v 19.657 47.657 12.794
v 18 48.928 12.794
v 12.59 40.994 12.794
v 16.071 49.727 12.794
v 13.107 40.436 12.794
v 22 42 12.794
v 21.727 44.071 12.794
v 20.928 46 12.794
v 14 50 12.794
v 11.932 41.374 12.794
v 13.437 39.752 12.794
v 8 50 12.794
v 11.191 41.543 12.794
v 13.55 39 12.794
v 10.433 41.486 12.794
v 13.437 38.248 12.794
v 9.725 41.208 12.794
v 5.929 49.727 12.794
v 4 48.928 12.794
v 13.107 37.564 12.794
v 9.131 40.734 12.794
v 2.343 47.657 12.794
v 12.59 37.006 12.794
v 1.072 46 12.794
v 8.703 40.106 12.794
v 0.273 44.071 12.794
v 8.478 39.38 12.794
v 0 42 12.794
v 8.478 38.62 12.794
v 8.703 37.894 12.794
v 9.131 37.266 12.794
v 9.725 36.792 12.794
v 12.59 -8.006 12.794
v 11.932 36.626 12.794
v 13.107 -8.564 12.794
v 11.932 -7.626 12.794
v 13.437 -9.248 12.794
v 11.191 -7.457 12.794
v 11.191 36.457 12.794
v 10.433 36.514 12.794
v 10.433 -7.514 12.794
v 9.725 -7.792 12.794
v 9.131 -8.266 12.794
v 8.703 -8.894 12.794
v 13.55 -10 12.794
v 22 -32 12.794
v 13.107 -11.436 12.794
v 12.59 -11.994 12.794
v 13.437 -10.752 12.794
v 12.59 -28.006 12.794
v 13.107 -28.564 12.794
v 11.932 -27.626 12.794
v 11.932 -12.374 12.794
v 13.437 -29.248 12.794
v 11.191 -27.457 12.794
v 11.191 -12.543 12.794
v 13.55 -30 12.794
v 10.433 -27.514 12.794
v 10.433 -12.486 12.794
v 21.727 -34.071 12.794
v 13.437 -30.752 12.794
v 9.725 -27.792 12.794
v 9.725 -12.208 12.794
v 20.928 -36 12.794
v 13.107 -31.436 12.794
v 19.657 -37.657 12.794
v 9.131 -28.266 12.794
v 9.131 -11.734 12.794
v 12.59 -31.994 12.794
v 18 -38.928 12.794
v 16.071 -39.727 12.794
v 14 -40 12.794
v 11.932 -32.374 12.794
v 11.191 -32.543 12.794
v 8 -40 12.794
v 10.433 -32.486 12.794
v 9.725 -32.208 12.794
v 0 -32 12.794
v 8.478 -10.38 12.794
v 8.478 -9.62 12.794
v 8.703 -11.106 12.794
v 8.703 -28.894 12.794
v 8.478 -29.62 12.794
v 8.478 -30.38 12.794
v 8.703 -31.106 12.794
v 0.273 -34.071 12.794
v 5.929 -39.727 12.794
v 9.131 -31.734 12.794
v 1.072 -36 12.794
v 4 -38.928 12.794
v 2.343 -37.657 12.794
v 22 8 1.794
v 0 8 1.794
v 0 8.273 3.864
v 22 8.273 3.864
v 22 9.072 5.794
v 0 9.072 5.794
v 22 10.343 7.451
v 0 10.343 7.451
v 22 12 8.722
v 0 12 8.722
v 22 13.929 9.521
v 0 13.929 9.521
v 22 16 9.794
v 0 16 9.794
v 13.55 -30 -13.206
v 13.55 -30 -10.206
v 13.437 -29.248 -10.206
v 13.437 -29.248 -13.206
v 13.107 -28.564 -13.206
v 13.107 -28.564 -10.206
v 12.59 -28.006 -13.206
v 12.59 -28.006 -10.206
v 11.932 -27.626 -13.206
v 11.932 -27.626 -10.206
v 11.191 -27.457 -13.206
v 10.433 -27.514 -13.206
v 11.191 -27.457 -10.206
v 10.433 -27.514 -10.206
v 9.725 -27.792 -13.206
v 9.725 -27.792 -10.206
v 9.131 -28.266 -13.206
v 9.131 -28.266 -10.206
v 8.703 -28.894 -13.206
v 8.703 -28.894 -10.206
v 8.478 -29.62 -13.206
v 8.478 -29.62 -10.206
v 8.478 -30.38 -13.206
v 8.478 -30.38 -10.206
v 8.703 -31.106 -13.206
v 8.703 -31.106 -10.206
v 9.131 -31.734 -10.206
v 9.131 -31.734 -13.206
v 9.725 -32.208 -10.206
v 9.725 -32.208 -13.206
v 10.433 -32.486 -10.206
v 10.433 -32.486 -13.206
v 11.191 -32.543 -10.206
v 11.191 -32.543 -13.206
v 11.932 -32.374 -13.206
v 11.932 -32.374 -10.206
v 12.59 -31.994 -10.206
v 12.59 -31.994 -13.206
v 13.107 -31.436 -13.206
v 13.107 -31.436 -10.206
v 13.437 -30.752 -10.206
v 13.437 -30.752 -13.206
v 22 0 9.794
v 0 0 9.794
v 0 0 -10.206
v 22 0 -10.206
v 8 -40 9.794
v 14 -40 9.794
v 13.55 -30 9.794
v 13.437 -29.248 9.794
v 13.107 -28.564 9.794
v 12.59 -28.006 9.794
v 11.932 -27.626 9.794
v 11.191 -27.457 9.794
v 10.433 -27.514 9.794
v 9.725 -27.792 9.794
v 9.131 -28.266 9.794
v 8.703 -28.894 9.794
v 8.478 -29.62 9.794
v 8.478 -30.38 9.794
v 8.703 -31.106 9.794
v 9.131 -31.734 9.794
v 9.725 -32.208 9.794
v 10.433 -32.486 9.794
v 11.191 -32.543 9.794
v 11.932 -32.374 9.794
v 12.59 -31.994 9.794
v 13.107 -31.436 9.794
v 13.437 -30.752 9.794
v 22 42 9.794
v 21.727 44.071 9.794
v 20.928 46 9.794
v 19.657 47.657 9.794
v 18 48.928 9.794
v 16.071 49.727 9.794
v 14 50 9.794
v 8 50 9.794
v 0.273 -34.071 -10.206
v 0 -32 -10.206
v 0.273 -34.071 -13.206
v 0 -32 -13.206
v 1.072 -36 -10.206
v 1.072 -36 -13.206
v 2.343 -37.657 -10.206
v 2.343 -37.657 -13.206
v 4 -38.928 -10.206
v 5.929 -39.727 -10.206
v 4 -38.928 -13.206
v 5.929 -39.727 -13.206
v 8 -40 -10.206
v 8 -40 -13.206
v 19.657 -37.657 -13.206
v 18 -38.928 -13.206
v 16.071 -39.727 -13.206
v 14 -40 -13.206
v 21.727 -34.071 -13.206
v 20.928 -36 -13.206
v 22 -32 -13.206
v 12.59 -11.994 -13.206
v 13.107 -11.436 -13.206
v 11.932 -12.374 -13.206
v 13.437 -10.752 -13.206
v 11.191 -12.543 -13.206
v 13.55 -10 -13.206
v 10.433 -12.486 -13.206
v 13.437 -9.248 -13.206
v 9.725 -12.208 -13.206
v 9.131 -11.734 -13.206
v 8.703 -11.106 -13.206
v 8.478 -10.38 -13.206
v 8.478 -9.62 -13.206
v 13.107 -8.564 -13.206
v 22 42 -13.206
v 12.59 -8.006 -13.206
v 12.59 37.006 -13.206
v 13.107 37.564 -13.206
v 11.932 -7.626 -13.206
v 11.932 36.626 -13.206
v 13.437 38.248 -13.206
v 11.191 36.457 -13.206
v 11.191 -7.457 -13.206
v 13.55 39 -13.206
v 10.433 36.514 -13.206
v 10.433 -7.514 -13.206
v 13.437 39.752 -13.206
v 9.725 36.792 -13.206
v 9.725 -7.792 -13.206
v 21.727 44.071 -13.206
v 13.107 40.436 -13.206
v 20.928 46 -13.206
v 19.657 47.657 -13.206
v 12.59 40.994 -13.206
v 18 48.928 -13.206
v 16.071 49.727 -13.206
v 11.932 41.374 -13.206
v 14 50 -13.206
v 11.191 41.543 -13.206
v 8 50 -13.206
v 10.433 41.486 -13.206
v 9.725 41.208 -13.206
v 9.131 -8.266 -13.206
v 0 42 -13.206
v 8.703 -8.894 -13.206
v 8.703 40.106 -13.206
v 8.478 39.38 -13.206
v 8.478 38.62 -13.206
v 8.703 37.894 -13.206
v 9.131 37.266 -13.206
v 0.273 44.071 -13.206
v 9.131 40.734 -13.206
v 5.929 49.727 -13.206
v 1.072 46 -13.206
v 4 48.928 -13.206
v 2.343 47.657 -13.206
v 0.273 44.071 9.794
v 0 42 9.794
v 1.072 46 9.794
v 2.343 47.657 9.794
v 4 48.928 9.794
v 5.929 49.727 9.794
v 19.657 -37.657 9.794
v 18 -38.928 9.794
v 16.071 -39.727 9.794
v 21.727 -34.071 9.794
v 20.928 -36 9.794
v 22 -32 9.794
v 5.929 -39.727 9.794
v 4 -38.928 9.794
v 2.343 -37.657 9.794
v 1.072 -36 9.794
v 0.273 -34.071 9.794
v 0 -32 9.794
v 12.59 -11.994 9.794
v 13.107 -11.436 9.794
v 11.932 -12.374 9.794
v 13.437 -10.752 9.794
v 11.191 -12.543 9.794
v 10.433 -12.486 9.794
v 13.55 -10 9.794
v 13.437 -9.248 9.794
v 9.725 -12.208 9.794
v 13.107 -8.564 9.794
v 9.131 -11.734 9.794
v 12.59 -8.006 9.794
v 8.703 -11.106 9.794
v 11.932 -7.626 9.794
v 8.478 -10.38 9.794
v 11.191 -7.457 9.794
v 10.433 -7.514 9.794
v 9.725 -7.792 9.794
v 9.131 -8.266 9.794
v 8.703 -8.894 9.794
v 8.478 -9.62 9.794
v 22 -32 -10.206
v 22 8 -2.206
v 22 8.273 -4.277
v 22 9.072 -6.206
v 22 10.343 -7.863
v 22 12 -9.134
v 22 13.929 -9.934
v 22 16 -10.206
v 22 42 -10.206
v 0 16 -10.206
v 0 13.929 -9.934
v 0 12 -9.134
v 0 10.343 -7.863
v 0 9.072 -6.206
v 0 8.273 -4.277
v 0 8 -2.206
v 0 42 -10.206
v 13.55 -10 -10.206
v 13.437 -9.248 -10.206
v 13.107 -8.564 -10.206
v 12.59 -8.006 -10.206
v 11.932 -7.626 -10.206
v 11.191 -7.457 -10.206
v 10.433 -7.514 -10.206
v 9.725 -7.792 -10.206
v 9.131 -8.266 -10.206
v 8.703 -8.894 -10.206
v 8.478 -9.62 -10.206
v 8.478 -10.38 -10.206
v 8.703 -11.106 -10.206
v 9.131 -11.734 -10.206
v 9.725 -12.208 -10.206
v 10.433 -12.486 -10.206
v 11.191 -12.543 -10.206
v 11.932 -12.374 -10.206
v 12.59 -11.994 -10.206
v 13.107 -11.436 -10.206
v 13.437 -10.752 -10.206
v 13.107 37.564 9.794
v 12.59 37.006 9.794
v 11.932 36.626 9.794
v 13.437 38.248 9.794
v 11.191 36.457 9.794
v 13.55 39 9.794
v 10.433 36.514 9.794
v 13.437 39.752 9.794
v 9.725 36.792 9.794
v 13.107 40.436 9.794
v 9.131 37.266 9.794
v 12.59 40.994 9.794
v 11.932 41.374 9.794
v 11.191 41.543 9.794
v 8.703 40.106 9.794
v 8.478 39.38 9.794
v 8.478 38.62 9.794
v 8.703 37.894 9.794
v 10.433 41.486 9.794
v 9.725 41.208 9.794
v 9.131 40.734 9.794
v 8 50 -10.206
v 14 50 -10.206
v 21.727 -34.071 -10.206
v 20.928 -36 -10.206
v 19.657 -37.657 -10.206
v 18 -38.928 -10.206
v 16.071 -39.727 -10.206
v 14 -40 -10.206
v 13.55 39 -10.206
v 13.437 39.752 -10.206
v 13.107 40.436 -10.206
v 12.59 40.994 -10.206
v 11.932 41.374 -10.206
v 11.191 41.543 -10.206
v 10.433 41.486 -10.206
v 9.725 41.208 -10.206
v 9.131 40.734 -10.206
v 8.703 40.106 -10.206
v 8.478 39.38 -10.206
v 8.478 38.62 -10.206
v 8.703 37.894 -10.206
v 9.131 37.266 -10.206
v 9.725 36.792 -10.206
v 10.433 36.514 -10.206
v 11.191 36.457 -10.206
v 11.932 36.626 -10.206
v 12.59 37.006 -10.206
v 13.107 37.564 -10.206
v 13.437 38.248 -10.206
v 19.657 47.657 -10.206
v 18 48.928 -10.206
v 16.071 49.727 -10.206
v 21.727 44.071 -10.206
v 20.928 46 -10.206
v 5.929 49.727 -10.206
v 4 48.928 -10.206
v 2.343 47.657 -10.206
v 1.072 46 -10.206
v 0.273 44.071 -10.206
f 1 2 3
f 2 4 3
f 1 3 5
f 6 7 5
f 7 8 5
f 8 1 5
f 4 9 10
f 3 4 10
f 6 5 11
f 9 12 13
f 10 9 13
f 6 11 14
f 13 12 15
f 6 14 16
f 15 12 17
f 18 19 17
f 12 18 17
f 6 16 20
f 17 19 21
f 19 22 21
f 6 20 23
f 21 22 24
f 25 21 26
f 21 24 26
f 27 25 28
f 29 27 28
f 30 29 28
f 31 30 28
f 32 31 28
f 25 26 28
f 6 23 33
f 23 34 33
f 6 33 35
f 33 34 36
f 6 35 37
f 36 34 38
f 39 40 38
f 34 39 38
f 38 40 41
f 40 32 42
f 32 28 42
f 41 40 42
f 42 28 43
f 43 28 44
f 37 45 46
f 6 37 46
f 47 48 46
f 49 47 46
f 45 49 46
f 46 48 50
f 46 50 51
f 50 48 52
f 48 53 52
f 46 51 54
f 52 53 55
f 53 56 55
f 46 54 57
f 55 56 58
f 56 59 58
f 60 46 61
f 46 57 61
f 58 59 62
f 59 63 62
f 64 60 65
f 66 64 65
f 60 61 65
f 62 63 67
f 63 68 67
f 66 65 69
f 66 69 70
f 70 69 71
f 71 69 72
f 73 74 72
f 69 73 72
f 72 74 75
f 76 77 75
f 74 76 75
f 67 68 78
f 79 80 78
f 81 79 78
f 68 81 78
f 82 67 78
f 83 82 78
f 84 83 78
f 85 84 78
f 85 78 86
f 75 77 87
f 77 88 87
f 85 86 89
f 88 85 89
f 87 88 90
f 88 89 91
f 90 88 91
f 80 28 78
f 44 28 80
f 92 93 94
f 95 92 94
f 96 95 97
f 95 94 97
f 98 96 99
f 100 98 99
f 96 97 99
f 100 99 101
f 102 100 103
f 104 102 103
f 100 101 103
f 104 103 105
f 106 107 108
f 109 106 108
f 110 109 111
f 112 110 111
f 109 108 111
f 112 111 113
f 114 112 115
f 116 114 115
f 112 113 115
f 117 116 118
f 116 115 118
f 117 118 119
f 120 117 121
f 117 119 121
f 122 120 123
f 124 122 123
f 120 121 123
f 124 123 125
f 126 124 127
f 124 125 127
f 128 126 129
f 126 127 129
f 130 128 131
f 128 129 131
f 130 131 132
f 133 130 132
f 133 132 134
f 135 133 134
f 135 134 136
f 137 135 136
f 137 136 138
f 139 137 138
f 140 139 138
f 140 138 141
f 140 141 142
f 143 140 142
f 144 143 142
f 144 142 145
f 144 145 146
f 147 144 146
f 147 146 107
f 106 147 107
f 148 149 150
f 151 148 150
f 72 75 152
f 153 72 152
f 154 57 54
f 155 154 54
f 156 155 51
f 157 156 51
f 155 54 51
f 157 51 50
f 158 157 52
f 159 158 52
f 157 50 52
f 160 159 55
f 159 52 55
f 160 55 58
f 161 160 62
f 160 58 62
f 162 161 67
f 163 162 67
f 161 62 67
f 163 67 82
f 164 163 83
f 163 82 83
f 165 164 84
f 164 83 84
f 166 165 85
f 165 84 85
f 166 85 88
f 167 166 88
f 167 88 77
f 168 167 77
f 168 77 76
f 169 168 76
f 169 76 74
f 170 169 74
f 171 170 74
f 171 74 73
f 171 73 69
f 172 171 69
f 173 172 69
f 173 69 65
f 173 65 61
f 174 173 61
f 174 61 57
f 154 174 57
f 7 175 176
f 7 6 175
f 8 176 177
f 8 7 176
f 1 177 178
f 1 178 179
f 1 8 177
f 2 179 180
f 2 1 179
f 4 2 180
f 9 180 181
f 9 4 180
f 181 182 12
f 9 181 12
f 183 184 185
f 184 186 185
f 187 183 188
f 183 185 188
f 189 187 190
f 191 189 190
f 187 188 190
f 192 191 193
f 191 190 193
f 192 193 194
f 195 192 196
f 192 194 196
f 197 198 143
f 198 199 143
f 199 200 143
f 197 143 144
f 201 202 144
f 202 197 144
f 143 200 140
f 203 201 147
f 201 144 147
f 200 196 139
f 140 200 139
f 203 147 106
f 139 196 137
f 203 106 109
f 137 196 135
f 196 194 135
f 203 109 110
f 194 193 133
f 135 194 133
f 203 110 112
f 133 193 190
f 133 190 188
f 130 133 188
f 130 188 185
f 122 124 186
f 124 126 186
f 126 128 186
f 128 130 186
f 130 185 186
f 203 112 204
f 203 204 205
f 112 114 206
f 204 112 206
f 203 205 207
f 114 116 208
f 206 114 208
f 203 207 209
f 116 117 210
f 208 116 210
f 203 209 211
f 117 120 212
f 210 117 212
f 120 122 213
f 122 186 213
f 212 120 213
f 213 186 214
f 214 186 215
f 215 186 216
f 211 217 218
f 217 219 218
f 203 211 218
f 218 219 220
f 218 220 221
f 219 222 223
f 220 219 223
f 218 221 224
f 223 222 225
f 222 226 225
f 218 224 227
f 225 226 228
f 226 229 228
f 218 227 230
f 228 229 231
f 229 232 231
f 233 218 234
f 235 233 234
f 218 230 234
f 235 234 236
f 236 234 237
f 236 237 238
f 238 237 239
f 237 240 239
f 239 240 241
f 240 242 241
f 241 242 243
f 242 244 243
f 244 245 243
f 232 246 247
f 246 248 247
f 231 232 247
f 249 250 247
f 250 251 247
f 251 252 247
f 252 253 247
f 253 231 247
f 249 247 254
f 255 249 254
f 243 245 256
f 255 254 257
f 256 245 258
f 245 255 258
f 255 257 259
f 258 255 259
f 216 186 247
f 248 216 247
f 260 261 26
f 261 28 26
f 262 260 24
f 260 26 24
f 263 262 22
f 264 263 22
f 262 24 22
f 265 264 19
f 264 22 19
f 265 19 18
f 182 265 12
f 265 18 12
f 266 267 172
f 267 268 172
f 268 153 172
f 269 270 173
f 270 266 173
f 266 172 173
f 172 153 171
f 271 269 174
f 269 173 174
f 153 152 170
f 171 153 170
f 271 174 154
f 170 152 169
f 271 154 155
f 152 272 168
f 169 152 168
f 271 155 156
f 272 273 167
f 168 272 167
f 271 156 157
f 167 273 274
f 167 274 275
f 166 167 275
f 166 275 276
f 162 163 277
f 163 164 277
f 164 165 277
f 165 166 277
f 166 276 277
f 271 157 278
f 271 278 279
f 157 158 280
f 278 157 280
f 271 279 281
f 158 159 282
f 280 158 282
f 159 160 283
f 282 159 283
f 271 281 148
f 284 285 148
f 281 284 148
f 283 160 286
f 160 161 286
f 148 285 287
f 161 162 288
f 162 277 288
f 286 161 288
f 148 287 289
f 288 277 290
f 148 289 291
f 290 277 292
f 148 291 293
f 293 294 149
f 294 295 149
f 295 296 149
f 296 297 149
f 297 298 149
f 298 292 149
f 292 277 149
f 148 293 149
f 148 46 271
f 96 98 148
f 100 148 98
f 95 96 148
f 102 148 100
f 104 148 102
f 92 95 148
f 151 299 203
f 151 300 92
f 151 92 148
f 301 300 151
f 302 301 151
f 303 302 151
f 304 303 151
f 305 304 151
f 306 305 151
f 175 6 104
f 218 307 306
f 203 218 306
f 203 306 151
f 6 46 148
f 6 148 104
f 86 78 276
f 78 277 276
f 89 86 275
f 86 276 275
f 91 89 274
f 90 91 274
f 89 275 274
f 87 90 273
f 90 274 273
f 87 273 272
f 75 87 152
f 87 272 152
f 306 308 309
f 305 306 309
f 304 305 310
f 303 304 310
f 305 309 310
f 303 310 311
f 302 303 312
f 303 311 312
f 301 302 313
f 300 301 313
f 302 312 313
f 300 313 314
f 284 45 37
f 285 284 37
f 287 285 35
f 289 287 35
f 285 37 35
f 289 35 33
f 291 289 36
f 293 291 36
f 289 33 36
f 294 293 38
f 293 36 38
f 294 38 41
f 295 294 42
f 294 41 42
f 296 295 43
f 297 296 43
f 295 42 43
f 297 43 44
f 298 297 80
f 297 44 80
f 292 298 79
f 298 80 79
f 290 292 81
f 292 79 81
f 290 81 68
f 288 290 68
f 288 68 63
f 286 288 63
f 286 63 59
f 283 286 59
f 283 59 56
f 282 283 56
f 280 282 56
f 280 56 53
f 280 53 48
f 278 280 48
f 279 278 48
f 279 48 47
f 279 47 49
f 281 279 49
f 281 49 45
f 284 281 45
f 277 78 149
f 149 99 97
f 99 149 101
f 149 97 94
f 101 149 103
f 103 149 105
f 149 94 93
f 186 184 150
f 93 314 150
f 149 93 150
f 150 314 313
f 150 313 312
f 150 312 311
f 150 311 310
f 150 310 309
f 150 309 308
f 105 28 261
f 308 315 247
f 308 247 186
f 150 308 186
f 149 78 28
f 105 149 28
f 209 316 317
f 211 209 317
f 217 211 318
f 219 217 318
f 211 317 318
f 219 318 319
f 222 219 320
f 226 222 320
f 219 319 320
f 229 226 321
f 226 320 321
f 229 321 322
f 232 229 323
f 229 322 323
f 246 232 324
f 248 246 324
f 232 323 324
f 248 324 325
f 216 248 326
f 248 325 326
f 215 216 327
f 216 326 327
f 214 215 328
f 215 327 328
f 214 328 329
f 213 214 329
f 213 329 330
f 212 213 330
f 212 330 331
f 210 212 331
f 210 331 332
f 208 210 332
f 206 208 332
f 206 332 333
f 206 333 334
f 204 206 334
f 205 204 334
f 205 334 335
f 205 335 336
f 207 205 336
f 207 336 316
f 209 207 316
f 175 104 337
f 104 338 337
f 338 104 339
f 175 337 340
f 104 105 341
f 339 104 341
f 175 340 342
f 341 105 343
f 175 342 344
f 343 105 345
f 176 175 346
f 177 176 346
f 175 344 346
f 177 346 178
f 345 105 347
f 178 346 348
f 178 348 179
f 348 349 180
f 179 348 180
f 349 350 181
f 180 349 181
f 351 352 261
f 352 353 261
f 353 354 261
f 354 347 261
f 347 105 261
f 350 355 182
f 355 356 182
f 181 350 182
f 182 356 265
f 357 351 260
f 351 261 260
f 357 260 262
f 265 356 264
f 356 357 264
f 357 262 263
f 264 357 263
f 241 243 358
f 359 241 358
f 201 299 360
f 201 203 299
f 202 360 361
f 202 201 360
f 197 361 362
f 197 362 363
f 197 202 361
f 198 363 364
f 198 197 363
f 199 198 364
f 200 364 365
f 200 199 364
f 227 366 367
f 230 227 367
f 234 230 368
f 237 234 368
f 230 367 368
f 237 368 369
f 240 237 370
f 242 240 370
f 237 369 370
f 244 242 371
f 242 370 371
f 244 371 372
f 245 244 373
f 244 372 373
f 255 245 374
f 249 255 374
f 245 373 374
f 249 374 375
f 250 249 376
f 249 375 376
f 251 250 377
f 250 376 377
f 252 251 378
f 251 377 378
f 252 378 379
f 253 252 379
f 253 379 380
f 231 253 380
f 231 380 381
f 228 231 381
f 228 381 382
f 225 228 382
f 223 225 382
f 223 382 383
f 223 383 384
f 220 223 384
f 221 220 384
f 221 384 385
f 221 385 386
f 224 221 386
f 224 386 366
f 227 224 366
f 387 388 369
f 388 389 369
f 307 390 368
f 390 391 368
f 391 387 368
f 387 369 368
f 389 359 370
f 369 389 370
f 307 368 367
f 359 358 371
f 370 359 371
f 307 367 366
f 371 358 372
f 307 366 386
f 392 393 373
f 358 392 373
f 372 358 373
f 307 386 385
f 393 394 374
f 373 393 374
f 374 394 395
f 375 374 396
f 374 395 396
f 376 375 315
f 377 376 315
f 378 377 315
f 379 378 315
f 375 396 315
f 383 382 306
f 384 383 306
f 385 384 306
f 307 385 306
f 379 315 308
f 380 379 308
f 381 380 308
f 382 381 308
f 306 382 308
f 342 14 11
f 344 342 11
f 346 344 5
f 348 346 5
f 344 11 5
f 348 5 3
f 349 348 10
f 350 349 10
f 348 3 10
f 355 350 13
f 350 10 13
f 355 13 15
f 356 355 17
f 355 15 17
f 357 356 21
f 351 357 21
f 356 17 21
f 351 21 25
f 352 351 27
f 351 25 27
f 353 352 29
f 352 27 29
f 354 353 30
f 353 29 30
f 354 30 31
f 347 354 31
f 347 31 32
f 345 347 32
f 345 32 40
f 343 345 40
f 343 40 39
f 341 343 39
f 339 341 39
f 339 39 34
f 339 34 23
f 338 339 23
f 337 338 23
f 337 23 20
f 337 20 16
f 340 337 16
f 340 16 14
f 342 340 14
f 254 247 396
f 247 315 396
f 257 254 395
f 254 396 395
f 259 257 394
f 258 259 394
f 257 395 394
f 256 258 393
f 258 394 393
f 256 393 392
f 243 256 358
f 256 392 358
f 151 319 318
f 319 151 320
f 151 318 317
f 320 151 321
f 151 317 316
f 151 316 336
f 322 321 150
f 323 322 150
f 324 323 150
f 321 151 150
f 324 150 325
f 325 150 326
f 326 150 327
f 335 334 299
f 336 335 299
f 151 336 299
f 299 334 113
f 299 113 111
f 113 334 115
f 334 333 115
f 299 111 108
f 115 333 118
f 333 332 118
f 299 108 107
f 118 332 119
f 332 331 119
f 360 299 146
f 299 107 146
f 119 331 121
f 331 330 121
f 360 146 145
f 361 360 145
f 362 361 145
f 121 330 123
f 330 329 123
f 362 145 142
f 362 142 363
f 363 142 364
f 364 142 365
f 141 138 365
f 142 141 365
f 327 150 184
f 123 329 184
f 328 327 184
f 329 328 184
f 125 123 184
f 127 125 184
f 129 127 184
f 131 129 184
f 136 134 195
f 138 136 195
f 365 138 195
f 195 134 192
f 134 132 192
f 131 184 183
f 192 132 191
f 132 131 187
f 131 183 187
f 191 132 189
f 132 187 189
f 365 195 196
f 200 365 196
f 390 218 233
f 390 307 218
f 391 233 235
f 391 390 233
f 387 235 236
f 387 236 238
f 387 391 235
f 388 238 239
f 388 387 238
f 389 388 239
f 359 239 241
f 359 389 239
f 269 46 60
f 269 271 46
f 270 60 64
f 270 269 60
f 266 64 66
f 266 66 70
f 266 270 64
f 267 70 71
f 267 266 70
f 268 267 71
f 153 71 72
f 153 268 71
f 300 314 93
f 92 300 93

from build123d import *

# Parameters (mm, degrees)
EXTRUDE_1_DEPTH     = 22
SKETCH_2_R          = 2.55
CUT_EXTRUDE_1_DEPTH = 61.497933849
FILLET_1_R          = 8


with BuildPart() as part:
    # Эскиз1 → Бобышка-Вытянуть1 (new body)
    with BuildSketch(Plane(origin=(0, 0, 0), x_dir=(0, 0, -1), z_dir=(1, 0, 0))):
        with BuildLine():
            Line((10.206185567, 0), (10.206185567, -40))
            Line((10.206185567, -40), (13.206185567, -40))
            Line((13.206185567, -40), (13.206185567, 50))
            Line((13.206185567, 50), (10.206185567, 50))
            Line((10.206185567, 50), (10.206185567, 16))
            ThreePointArc((10.206185567, 16), (7.863039817, 10.343145751), (2.206185567, 8))
            Line((2.206185567, 8), (-1.793814433, 8))
            ThreePointArc((-1.793814433, 8), (-7.450668682, 10.343145751), (-9.793814433, 16))
            Line((-9.793814433, 16), (-9.793814433, 50))
            Line((-9.793814433, 50), (-12.793814433, 50))
            Line((-12.793814433, 50), (-12.793814433, -40))
            Line((-12.793814433, -40), (-9.793814433, -40))
            Line((-9.793814433, -40), (-9.793814433, 0))
            Line((-9.793814433, 0), (10.206185567, 0))
        make_face()
    extrude(amount=EXTRUDE_1_DEPTH)

    # Эскиз2 → Вырез-Вытянуть1 (cut, through all)
    with BuildSketch(Plane.XY.offset(12.793814433)):
        with Locations((11, -30)):
            Circle(SKETCH_2_R)
        with Locations((11, -10)):
            Circle(SKETCH_2_R)
        with Locations((11, 39)):
            Circle(SKETCH_2_R)
    extrude(amount=-CUT_EXTRUDE_1_DEPTH, mode=Mode.SUBTRACT)

    # Скругление1
    fillet_1_edges = [part.edges().sort_by_distance(p)[0] for p in [
        (22, -40, -11.706185567),
        (0, -40, 11.293814433),
        (0, 50, 11.293814433),
        (22, 50, -11.706185567),
        (0, 50, -11.706185567),
        (0, -40, -11.706185567),
        (22, 50, 11.293814433),
        (22, -40, 11.293814433),
    ]]
    fillet(fillet_1_edges, radius=FILLET_1_R)


solid = part.part
